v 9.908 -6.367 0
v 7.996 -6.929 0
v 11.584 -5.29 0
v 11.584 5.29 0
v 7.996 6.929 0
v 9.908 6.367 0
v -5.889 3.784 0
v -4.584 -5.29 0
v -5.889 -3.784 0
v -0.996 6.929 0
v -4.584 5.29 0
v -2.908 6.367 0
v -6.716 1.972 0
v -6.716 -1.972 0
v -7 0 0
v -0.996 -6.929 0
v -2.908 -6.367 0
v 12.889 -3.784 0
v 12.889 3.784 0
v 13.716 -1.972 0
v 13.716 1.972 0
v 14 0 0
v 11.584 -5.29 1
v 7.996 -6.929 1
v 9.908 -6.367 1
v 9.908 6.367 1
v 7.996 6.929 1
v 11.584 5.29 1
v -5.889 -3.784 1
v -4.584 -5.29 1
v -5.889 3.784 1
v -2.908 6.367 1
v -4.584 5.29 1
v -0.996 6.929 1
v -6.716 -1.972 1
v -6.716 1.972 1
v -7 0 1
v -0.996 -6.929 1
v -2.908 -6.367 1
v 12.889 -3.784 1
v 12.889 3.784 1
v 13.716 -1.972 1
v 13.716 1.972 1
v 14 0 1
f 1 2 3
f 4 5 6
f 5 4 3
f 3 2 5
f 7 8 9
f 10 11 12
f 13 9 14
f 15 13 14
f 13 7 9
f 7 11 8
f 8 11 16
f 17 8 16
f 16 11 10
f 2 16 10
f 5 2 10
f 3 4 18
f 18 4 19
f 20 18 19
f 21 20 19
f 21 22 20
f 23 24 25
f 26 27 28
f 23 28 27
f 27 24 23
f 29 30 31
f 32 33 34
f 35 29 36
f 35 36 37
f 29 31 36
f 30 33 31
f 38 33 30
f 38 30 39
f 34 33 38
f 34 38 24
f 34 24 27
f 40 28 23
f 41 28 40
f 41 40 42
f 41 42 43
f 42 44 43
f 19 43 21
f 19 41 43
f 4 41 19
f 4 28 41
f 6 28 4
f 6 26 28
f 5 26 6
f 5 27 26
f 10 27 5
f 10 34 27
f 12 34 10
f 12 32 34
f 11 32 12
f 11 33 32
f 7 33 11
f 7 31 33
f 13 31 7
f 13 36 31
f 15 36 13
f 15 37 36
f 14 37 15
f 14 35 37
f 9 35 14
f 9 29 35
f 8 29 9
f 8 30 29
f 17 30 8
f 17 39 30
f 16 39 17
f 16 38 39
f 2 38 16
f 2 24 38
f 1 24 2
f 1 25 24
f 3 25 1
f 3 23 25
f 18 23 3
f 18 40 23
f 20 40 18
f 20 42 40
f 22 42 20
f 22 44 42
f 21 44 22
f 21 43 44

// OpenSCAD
linear_extrude(1)minkowski(){
	circle(7);
	square([7,1e-9]);
}
